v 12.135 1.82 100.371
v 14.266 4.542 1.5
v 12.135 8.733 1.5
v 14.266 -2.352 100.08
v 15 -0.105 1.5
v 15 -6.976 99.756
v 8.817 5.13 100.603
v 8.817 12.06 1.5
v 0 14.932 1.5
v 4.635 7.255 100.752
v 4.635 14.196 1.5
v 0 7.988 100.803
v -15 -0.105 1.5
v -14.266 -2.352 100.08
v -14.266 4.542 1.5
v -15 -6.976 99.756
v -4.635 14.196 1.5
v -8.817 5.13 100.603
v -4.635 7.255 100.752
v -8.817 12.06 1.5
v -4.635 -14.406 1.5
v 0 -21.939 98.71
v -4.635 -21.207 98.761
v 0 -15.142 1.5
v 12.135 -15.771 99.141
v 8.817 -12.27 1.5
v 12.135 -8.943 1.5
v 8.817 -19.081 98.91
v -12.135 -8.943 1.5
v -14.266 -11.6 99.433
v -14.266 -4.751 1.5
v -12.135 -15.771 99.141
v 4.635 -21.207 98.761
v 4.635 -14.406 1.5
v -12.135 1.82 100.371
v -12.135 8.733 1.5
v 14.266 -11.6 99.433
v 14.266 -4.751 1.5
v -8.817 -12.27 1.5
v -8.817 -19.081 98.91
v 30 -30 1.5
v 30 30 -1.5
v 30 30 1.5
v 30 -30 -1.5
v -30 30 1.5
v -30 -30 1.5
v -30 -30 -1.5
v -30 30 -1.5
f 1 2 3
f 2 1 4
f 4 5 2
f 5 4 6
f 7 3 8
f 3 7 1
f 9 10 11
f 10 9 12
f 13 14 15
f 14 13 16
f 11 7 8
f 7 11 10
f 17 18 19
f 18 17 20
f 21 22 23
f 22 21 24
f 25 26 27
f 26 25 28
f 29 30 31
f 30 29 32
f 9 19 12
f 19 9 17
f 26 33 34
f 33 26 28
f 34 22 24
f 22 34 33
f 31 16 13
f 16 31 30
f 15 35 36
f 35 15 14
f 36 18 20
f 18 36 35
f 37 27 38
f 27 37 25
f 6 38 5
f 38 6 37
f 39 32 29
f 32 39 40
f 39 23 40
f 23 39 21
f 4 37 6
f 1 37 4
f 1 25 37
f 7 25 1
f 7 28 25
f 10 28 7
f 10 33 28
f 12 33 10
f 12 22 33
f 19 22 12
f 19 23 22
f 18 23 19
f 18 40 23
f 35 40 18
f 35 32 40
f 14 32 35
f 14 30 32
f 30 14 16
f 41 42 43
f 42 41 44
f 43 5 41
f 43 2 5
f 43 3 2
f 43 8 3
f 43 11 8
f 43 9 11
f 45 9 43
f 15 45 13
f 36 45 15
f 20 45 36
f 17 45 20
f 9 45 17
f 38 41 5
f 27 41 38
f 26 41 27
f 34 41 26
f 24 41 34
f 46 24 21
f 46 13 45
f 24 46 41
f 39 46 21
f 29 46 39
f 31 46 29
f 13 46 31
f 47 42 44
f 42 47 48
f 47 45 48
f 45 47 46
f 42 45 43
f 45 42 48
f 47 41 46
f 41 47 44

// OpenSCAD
// file: top.scad
//top.scad

module top_section(width, height){
   radius=0.5*width;
   cylinder(h=height, r1=radius, r2=radius);
}
// file: middle.scad
//middle.scad

module middle_section(width, height){
   radius=0.5*width;
   cylinder(h=height, r1=radius, r2=radius);
} 
// file: bottom.scad
//bottom.scad

module bottom_section(width, height){
    radius=0.5*width;
    cylinder(h=height, r1=radius, r2=radius);
}
// main file
//tower.scad v1

use <bottom.scad>
use <middle.scad>
use <top.scad>

tower_height= 100;
tower_width= 0.3*tower_height;
bottom_height= 0.2*tower_height;
middle_height= 0.65*tower_height;
top_height= 0.15*tower_height;

base_width= 2*tower_width;
base_height= 0.1*tower_width;

lean_angle= 4;

$fn=20;

rotate([lean_angle,0,0]){
    color("white") 
        bottom_section(tower_width, bottom_height);
    color("white") 
        translate([0,0,0.2*tower_height]) 
            middle_section(tower_width, middle_height);
    color("white") 
        translate([0,0,0.85*tower_height]) 
            top_section(tower_width,top_height);
}

color("lightgreen") 
   cube([base_width,base_width,base_height], center=true);
